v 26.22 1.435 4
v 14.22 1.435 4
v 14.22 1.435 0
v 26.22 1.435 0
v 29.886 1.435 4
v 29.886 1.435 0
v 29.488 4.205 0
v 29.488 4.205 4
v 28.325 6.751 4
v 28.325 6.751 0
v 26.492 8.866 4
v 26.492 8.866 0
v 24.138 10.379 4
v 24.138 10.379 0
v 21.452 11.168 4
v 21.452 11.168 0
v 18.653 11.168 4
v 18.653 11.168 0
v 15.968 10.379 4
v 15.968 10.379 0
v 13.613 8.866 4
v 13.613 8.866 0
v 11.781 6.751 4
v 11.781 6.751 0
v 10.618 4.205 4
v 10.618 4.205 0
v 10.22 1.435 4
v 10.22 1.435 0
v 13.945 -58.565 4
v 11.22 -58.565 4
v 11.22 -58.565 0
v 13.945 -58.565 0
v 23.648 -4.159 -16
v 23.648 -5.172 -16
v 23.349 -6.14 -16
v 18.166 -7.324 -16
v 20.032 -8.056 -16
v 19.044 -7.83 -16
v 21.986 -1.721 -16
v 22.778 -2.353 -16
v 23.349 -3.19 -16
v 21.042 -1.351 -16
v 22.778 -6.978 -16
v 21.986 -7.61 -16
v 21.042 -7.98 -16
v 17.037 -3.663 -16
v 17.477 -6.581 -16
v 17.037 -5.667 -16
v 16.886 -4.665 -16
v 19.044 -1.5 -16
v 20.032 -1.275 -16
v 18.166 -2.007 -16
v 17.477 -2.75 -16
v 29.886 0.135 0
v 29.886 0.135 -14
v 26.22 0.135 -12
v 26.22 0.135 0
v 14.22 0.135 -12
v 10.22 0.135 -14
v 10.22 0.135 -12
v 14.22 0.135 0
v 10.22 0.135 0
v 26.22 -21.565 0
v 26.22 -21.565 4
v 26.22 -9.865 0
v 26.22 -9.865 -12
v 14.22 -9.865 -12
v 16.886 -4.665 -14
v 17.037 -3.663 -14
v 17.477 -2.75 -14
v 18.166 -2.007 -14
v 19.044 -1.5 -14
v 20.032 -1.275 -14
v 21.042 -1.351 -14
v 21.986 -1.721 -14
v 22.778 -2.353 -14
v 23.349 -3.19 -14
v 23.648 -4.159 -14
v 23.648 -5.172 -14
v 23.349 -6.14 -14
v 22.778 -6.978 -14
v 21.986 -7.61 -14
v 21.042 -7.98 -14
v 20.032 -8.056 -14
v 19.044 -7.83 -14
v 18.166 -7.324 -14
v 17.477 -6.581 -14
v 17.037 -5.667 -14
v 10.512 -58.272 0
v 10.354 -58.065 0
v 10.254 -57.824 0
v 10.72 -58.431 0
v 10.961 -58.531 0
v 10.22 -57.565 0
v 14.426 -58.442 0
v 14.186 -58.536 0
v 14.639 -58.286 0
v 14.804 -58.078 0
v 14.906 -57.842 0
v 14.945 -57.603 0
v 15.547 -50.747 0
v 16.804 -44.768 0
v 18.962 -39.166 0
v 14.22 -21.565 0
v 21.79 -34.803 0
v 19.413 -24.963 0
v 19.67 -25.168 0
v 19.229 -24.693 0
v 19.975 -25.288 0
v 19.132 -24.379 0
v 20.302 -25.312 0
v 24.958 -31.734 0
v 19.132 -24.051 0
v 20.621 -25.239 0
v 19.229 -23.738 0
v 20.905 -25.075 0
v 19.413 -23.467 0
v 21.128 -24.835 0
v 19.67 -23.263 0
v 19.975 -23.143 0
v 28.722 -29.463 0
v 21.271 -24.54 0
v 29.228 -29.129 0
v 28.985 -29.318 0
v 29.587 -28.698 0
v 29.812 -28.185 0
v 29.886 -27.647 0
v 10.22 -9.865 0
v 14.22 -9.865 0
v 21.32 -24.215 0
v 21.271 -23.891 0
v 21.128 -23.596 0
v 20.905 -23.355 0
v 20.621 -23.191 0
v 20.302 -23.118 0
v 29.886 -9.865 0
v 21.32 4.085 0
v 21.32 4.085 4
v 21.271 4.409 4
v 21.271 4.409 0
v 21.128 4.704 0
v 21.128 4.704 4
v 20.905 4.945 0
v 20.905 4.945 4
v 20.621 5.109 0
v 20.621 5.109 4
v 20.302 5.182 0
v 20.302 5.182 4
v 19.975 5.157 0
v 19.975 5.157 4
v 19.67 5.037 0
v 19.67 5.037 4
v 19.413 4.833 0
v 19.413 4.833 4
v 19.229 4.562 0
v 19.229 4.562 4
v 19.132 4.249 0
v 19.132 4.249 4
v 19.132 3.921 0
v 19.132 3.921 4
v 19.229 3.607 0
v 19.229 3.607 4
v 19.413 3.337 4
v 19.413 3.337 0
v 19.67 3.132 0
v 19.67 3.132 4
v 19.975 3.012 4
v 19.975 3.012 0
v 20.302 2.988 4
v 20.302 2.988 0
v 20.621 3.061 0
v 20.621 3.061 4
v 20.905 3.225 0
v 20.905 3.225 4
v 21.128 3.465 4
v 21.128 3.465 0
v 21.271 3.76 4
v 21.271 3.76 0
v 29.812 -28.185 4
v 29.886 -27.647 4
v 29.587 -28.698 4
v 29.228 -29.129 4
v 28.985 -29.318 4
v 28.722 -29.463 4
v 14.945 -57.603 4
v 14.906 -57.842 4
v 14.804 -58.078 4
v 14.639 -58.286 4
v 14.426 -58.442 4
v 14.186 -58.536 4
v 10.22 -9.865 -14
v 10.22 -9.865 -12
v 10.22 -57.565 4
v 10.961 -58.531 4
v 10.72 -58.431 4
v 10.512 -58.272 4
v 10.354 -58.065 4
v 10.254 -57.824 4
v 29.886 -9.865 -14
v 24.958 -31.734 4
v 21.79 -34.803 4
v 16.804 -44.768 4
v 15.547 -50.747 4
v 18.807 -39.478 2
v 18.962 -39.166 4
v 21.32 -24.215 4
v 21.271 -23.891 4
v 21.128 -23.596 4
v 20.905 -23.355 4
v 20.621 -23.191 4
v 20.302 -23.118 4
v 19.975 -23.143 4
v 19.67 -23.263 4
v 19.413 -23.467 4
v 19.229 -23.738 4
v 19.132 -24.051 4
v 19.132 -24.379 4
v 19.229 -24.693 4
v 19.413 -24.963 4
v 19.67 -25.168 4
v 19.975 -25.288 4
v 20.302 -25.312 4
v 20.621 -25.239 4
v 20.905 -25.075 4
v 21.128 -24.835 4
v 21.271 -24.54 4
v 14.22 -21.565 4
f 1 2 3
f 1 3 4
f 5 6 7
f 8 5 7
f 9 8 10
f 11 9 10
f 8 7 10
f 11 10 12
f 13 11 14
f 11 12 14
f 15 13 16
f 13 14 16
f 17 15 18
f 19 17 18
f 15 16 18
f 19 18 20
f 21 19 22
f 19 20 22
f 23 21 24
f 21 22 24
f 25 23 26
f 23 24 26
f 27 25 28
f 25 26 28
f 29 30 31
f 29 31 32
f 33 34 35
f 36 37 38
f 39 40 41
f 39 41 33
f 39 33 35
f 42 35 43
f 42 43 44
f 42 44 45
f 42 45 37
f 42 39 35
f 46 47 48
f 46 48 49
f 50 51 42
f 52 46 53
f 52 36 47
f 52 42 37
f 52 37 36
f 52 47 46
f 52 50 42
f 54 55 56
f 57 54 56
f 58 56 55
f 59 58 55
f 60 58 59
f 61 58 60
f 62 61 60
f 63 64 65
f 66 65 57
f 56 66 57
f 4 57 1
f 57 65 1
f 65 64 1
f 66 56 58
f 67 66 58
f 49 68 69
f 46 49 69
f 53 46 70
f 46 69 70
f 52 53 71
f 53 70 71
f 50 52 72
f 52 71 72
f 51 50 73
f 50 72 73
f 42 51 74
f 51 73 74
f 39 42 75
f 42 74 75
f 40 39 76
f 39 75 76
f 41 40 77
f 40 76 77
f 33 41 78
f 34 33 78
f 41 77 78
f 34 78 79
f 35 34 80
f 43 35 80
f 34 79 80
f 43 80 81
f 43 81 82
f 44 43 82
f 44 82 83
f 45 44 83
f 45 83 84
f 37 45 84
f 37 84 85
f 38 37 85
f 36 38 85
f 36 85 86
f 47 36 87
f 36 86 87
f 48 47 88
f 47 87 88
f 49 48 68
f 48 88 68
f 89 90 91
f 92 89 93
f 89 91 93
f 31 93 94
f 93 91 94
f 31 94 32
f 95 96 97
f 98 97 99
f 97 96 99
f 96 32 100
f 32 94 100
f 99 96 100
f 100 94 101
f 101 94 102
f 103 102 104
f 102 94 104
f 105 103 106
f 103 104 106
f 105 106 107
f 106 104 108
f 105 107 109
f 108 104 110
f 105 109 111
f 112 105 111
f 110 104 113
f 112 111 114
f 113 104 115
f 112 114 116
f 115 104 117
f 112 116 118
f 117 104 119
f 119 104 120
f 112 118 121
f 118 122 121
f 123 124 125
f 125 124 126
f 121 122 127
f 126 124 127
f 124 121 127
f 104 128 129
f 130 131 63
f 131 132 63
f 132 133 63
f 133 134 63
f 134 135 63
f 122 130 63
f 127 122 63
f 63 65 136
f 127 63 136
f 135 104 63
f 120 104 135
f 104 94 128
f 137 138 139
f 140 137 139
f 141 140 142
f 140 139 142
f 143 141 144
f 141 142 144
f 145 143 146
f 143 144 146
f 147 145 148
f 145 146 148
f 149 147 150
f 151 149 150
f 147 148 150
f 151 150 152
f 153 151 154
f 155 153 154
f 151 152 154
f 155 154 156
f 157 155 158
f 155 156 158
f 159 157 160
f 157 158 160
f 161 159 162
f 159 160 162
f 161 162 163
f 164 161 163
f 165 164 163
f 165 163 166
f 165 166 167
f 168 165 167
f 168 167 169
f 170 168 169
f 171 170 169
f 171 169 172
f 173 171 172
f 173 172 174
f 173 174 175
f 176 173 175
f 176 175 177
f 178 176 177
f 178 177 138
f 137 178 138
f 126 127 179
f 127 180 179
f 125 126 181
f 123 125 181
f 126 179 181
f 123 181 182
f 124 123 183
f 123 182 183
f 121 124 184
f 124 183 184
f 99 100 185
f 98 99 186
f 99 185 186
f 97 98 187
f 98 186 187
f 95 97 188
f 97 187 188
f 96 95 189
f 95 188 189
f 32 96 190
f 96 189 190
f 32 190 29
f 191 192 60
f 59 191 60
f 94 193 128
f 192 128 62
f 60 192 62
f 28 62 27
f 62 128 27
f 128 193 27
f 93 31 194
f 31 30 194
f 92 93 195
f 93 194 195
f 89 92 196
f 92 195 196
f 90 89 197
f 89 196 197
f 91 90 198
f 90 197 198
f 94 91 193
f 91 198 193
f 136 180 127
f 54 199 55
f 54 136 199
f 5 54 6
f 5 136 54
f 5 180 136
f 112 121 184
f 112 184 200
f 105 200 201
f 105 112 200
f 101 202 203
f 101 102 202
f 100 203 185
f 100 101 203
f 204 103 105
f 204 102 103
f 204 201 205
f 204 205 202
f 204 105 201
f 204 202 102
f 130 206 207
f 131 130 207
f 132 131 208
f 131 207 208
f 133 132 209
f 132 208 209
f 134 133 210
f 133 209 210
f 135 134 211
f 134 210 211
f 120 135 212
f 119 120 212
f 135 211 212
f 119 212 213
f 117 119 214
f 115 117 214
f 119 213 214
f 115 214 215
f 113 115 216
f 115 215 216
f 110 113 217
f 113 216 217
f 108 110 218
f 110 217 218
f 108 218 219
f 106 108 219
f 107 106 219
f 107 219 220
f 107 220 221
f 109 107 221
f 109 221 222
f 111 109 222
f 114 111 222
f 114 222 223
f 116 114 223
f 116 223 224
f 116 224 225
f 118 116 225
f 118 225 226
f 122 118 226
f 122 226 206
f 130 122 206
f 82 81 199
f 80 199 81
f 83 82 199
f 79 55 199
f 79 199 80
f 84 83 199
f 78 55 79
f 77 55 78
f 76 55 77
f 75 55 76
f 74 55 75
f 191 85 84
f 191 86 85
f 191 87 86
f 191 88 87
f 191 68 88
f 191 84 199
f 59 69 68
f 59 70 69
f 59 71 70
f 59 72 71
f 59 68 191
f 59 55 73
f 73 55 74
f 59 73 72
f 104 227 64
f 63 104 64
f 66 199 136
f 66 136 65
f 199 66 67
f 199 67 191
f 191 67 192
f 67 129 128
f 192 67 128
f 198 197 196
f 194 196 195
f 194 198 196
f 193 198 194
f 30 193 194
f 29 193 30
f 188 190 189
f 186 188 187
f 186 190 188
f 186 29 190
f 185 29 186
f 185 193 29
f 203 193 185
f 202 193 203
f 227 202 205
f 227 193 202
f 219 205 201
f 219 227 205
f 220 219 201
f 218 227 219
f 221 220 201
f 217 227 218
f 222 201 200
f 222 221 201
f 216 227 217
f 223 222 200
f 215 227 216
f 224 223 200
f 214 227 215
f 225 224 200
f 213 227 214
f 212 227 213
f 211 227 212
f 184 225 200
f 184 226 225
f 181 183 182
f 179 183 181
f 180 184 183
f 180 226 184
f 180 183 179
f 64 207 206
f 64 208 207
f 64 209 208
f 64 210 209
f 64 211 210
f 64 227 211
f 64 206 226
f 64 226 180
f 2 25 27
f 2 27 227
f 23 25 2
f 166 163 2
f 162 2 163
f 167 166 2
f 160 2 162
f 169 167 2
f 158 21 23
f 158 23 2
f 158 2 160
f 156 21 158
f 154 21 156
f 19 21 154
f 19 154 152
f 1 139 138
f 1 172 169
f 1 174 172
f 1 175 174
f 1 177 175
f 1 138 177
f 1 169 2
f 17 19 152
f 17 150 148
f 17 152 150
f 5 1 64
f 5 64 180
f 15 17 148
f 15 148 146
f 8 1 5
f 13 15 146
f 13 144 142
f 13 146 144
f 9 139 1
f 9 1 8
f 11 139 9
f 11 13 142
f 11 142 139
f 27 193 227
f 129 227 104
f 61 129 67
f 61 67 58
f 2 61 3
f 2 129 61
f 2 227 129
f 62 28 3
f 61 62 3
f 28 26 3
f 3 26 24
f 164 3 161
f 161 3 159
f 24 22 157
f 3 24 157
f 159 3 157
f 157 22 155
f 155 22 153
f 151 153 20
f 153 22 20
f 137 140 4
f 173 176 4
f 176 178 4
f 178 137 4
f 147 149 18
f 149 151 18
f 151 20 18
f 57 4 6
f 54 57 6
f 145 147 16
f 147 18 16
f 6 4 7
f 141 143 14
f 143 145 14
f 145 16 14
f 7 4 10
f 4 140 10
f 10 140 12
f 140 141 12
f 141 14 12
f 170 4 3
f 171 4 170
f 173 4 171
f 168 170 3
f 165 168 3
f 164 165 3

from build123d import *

# Parameters (mm, degrees)
BOSS_EXTRUDE1_DEPTH = 4
CUT_EXTRUDE1_REACH  = 67.872
SKETCH2_R           = 1.1
SKETCH2_W           = 12
SKETCH2_H           = 23
FILLET1_R           = 2
FILLET2_R           = 1
FILLET3_R           = 1
SKETCH3_W           = 3.666320095
SKETCH3_H           = 10
SKETCH3_W_2         = 4
BOSS_EXTRUDE2_DEPTH = 12
SKETCH4_W           = 19.666320095
SKETCH4_H           = 10
BOSS_EXTRUDE3_DEPTH = 2
SKETCH5_R           = 3.4
BOSS_EXTRUDE4_DEPTH = 2


with BuildPart() as part:
    # Sketch1 → Boss-Extrude1 (new body)
    with BuildSketch(Plane.XY):
        with BuildLine():
            Line((10.219576084, 1.434709353), (10.219576084, -58.565290647))
            Line((10.219576084, -58.565290647), (14.921299434, -58.565290647))
            Line((14.921299434, -58.565290647), (14.921299434, -58.307205095))
            add(Edge.make_bspline(
                [(29.885896179, -28.969975988), (15.603913992, -34.528623974), (14.921299434, -58.307205095)],
                knots=[0, 0, 0, 1, 1, 1], degree=2))
            Line((29.885896179, -28.969975988), (29.885896179, 1.434709353))
            ThreePointArc((29.885896179, 1.434709353), (20.052736131, 11.2678694), (10.219576084, 1.434709353))
        make_face()
    extrude(amount=BOSS_EXTRUDE1_DEPTH)

    # Sketch2 → Cut-Extrude1 (cut, up to next)
    with BuildSketch(Plane.XY.offset(4), mode=Mode.PRIVATE) as cut_extrude1_sk1:
        with Locations((20.219576084, 4.084709353)):
            Circle(SKETCH2_R)
    cut_extrude1_tool1 = extrude(cut_extrude1_sk1.sketch, amount=-CUT_EXTRUDE1_REACH, mode=Mode.PRIVATE) & part.part
    # Sketch2 → Cut-Extrude1 (cut, up to next)
    with BuildSketch(Plane.XY.offset(4), mode=Mode.PRIVATE) as cut_extrude1_sk2:
        with Locations((20.219576084, -24.215290647)):
            Circle(SKETCH2_R)
    cut_extrude1_tool2 = extrude(cut_extrude1_sk2.sketch, amount=-CUT_EXTRUDE1_REACH, mode=Mode.PRIVATE) & part.part
    # Sketch2 → Cut-Extrude1 (cut, up to next)
    with BuildSketch(Plane.XY.offset(4), mode=Mode.PRIVATE) as cut_extrude1_sk3:
        with Locations((20.219576084, -10.065290647)):
            Rectangle(SKETCH2_W, SKETCH2_H)
    cut_extrude1_tool3 = extrude(cut_extrude1_sk3.sketch, amount=-CUT_EXTRUDE1_REACH, mode=Mode.PRIVATE) & part.part
    add(cut_extrude1_tool1.solids().sort_by_distance((20.219576, 4.084709, 4))[0], mode=Mode.SUBTRACT)
    add(cut_extrude1_tool2.solids().sort_by_distance((20.219576, -24.215291, 4))[0], mode=Mode.SUBTRACT)
    add(cut_extrude1_tool3.solids().sort_by_distance((20.219576, -10.065291, 4))[0], mode=Mode.SUBTRACT)

    # Fillet1
    fillet1_edges = [part.edges().sort_by_distance(p)[0] for p in [
        (29.885896179, -28.969975988, 2),
    ]]
    fillet(fillet1_edges, radius=FILLET1_R)

    # Fillet2
    fillet2_edges = [part.edges().sort_by_distance(p)[0] for p in [
        (14.921299434, -58.565290647, 2),
    ]]
    fillet(fillet2_edges, radius=FILLET2_R)

    # Fillet3
    fillet3_edges = [part.edges().sort_by_distance(p)[0] for p in [
        (10.219576084, -58.565290647, 2),
    ]]
    fillet(fillet3_edges, radius=FILLET3_R)

    # Sketch3 → Boss-Extrude2 (add)
    with BuildSketch(Plane(origin=(0, 0, 0), x_dir=(-1, 0, 0), z_dir=(0, 0, -1))):
        with Locations((-28.052736132, -4.865290647)):
            Rectangle(SKETCH3_W, SKETCH3_H)
        with Locations((-12.219576084, -4.865290647)):
            Rectangle(SKETCH3_W_2, SKETCH3_H)
    extrude(amount=BOSS_EXTRUDE2_DEPTH)

    # Sketch4 → Boss-Extrude3 (add)
    with BuildSketch(Plane(origin=(0, 0, -12), x_dir=(-1, 0, 0), z_dir=(0, 0, -1))):
        with Locations((-20.052736132, -4.865290647)):
            Rectangle(SKETCH4_W, SKETCH4_H)
    extrude(amount=BOSS_EXTRUDE3_DEPTH)

    # Sketch5 → Boss-Extrude4 (add)
    with BuildSketch(Plane(origin=(0, 0, -14), x_dir=(-1, 0, 0), z_dir=(0, 0, -1))):
        with Locations((-20.285896179, -4.665290647)):
            Circle(SKETCH5_R)
    extrude(amount=BOSS_EXTRUDE4_DEPTH)


solid = part.part
